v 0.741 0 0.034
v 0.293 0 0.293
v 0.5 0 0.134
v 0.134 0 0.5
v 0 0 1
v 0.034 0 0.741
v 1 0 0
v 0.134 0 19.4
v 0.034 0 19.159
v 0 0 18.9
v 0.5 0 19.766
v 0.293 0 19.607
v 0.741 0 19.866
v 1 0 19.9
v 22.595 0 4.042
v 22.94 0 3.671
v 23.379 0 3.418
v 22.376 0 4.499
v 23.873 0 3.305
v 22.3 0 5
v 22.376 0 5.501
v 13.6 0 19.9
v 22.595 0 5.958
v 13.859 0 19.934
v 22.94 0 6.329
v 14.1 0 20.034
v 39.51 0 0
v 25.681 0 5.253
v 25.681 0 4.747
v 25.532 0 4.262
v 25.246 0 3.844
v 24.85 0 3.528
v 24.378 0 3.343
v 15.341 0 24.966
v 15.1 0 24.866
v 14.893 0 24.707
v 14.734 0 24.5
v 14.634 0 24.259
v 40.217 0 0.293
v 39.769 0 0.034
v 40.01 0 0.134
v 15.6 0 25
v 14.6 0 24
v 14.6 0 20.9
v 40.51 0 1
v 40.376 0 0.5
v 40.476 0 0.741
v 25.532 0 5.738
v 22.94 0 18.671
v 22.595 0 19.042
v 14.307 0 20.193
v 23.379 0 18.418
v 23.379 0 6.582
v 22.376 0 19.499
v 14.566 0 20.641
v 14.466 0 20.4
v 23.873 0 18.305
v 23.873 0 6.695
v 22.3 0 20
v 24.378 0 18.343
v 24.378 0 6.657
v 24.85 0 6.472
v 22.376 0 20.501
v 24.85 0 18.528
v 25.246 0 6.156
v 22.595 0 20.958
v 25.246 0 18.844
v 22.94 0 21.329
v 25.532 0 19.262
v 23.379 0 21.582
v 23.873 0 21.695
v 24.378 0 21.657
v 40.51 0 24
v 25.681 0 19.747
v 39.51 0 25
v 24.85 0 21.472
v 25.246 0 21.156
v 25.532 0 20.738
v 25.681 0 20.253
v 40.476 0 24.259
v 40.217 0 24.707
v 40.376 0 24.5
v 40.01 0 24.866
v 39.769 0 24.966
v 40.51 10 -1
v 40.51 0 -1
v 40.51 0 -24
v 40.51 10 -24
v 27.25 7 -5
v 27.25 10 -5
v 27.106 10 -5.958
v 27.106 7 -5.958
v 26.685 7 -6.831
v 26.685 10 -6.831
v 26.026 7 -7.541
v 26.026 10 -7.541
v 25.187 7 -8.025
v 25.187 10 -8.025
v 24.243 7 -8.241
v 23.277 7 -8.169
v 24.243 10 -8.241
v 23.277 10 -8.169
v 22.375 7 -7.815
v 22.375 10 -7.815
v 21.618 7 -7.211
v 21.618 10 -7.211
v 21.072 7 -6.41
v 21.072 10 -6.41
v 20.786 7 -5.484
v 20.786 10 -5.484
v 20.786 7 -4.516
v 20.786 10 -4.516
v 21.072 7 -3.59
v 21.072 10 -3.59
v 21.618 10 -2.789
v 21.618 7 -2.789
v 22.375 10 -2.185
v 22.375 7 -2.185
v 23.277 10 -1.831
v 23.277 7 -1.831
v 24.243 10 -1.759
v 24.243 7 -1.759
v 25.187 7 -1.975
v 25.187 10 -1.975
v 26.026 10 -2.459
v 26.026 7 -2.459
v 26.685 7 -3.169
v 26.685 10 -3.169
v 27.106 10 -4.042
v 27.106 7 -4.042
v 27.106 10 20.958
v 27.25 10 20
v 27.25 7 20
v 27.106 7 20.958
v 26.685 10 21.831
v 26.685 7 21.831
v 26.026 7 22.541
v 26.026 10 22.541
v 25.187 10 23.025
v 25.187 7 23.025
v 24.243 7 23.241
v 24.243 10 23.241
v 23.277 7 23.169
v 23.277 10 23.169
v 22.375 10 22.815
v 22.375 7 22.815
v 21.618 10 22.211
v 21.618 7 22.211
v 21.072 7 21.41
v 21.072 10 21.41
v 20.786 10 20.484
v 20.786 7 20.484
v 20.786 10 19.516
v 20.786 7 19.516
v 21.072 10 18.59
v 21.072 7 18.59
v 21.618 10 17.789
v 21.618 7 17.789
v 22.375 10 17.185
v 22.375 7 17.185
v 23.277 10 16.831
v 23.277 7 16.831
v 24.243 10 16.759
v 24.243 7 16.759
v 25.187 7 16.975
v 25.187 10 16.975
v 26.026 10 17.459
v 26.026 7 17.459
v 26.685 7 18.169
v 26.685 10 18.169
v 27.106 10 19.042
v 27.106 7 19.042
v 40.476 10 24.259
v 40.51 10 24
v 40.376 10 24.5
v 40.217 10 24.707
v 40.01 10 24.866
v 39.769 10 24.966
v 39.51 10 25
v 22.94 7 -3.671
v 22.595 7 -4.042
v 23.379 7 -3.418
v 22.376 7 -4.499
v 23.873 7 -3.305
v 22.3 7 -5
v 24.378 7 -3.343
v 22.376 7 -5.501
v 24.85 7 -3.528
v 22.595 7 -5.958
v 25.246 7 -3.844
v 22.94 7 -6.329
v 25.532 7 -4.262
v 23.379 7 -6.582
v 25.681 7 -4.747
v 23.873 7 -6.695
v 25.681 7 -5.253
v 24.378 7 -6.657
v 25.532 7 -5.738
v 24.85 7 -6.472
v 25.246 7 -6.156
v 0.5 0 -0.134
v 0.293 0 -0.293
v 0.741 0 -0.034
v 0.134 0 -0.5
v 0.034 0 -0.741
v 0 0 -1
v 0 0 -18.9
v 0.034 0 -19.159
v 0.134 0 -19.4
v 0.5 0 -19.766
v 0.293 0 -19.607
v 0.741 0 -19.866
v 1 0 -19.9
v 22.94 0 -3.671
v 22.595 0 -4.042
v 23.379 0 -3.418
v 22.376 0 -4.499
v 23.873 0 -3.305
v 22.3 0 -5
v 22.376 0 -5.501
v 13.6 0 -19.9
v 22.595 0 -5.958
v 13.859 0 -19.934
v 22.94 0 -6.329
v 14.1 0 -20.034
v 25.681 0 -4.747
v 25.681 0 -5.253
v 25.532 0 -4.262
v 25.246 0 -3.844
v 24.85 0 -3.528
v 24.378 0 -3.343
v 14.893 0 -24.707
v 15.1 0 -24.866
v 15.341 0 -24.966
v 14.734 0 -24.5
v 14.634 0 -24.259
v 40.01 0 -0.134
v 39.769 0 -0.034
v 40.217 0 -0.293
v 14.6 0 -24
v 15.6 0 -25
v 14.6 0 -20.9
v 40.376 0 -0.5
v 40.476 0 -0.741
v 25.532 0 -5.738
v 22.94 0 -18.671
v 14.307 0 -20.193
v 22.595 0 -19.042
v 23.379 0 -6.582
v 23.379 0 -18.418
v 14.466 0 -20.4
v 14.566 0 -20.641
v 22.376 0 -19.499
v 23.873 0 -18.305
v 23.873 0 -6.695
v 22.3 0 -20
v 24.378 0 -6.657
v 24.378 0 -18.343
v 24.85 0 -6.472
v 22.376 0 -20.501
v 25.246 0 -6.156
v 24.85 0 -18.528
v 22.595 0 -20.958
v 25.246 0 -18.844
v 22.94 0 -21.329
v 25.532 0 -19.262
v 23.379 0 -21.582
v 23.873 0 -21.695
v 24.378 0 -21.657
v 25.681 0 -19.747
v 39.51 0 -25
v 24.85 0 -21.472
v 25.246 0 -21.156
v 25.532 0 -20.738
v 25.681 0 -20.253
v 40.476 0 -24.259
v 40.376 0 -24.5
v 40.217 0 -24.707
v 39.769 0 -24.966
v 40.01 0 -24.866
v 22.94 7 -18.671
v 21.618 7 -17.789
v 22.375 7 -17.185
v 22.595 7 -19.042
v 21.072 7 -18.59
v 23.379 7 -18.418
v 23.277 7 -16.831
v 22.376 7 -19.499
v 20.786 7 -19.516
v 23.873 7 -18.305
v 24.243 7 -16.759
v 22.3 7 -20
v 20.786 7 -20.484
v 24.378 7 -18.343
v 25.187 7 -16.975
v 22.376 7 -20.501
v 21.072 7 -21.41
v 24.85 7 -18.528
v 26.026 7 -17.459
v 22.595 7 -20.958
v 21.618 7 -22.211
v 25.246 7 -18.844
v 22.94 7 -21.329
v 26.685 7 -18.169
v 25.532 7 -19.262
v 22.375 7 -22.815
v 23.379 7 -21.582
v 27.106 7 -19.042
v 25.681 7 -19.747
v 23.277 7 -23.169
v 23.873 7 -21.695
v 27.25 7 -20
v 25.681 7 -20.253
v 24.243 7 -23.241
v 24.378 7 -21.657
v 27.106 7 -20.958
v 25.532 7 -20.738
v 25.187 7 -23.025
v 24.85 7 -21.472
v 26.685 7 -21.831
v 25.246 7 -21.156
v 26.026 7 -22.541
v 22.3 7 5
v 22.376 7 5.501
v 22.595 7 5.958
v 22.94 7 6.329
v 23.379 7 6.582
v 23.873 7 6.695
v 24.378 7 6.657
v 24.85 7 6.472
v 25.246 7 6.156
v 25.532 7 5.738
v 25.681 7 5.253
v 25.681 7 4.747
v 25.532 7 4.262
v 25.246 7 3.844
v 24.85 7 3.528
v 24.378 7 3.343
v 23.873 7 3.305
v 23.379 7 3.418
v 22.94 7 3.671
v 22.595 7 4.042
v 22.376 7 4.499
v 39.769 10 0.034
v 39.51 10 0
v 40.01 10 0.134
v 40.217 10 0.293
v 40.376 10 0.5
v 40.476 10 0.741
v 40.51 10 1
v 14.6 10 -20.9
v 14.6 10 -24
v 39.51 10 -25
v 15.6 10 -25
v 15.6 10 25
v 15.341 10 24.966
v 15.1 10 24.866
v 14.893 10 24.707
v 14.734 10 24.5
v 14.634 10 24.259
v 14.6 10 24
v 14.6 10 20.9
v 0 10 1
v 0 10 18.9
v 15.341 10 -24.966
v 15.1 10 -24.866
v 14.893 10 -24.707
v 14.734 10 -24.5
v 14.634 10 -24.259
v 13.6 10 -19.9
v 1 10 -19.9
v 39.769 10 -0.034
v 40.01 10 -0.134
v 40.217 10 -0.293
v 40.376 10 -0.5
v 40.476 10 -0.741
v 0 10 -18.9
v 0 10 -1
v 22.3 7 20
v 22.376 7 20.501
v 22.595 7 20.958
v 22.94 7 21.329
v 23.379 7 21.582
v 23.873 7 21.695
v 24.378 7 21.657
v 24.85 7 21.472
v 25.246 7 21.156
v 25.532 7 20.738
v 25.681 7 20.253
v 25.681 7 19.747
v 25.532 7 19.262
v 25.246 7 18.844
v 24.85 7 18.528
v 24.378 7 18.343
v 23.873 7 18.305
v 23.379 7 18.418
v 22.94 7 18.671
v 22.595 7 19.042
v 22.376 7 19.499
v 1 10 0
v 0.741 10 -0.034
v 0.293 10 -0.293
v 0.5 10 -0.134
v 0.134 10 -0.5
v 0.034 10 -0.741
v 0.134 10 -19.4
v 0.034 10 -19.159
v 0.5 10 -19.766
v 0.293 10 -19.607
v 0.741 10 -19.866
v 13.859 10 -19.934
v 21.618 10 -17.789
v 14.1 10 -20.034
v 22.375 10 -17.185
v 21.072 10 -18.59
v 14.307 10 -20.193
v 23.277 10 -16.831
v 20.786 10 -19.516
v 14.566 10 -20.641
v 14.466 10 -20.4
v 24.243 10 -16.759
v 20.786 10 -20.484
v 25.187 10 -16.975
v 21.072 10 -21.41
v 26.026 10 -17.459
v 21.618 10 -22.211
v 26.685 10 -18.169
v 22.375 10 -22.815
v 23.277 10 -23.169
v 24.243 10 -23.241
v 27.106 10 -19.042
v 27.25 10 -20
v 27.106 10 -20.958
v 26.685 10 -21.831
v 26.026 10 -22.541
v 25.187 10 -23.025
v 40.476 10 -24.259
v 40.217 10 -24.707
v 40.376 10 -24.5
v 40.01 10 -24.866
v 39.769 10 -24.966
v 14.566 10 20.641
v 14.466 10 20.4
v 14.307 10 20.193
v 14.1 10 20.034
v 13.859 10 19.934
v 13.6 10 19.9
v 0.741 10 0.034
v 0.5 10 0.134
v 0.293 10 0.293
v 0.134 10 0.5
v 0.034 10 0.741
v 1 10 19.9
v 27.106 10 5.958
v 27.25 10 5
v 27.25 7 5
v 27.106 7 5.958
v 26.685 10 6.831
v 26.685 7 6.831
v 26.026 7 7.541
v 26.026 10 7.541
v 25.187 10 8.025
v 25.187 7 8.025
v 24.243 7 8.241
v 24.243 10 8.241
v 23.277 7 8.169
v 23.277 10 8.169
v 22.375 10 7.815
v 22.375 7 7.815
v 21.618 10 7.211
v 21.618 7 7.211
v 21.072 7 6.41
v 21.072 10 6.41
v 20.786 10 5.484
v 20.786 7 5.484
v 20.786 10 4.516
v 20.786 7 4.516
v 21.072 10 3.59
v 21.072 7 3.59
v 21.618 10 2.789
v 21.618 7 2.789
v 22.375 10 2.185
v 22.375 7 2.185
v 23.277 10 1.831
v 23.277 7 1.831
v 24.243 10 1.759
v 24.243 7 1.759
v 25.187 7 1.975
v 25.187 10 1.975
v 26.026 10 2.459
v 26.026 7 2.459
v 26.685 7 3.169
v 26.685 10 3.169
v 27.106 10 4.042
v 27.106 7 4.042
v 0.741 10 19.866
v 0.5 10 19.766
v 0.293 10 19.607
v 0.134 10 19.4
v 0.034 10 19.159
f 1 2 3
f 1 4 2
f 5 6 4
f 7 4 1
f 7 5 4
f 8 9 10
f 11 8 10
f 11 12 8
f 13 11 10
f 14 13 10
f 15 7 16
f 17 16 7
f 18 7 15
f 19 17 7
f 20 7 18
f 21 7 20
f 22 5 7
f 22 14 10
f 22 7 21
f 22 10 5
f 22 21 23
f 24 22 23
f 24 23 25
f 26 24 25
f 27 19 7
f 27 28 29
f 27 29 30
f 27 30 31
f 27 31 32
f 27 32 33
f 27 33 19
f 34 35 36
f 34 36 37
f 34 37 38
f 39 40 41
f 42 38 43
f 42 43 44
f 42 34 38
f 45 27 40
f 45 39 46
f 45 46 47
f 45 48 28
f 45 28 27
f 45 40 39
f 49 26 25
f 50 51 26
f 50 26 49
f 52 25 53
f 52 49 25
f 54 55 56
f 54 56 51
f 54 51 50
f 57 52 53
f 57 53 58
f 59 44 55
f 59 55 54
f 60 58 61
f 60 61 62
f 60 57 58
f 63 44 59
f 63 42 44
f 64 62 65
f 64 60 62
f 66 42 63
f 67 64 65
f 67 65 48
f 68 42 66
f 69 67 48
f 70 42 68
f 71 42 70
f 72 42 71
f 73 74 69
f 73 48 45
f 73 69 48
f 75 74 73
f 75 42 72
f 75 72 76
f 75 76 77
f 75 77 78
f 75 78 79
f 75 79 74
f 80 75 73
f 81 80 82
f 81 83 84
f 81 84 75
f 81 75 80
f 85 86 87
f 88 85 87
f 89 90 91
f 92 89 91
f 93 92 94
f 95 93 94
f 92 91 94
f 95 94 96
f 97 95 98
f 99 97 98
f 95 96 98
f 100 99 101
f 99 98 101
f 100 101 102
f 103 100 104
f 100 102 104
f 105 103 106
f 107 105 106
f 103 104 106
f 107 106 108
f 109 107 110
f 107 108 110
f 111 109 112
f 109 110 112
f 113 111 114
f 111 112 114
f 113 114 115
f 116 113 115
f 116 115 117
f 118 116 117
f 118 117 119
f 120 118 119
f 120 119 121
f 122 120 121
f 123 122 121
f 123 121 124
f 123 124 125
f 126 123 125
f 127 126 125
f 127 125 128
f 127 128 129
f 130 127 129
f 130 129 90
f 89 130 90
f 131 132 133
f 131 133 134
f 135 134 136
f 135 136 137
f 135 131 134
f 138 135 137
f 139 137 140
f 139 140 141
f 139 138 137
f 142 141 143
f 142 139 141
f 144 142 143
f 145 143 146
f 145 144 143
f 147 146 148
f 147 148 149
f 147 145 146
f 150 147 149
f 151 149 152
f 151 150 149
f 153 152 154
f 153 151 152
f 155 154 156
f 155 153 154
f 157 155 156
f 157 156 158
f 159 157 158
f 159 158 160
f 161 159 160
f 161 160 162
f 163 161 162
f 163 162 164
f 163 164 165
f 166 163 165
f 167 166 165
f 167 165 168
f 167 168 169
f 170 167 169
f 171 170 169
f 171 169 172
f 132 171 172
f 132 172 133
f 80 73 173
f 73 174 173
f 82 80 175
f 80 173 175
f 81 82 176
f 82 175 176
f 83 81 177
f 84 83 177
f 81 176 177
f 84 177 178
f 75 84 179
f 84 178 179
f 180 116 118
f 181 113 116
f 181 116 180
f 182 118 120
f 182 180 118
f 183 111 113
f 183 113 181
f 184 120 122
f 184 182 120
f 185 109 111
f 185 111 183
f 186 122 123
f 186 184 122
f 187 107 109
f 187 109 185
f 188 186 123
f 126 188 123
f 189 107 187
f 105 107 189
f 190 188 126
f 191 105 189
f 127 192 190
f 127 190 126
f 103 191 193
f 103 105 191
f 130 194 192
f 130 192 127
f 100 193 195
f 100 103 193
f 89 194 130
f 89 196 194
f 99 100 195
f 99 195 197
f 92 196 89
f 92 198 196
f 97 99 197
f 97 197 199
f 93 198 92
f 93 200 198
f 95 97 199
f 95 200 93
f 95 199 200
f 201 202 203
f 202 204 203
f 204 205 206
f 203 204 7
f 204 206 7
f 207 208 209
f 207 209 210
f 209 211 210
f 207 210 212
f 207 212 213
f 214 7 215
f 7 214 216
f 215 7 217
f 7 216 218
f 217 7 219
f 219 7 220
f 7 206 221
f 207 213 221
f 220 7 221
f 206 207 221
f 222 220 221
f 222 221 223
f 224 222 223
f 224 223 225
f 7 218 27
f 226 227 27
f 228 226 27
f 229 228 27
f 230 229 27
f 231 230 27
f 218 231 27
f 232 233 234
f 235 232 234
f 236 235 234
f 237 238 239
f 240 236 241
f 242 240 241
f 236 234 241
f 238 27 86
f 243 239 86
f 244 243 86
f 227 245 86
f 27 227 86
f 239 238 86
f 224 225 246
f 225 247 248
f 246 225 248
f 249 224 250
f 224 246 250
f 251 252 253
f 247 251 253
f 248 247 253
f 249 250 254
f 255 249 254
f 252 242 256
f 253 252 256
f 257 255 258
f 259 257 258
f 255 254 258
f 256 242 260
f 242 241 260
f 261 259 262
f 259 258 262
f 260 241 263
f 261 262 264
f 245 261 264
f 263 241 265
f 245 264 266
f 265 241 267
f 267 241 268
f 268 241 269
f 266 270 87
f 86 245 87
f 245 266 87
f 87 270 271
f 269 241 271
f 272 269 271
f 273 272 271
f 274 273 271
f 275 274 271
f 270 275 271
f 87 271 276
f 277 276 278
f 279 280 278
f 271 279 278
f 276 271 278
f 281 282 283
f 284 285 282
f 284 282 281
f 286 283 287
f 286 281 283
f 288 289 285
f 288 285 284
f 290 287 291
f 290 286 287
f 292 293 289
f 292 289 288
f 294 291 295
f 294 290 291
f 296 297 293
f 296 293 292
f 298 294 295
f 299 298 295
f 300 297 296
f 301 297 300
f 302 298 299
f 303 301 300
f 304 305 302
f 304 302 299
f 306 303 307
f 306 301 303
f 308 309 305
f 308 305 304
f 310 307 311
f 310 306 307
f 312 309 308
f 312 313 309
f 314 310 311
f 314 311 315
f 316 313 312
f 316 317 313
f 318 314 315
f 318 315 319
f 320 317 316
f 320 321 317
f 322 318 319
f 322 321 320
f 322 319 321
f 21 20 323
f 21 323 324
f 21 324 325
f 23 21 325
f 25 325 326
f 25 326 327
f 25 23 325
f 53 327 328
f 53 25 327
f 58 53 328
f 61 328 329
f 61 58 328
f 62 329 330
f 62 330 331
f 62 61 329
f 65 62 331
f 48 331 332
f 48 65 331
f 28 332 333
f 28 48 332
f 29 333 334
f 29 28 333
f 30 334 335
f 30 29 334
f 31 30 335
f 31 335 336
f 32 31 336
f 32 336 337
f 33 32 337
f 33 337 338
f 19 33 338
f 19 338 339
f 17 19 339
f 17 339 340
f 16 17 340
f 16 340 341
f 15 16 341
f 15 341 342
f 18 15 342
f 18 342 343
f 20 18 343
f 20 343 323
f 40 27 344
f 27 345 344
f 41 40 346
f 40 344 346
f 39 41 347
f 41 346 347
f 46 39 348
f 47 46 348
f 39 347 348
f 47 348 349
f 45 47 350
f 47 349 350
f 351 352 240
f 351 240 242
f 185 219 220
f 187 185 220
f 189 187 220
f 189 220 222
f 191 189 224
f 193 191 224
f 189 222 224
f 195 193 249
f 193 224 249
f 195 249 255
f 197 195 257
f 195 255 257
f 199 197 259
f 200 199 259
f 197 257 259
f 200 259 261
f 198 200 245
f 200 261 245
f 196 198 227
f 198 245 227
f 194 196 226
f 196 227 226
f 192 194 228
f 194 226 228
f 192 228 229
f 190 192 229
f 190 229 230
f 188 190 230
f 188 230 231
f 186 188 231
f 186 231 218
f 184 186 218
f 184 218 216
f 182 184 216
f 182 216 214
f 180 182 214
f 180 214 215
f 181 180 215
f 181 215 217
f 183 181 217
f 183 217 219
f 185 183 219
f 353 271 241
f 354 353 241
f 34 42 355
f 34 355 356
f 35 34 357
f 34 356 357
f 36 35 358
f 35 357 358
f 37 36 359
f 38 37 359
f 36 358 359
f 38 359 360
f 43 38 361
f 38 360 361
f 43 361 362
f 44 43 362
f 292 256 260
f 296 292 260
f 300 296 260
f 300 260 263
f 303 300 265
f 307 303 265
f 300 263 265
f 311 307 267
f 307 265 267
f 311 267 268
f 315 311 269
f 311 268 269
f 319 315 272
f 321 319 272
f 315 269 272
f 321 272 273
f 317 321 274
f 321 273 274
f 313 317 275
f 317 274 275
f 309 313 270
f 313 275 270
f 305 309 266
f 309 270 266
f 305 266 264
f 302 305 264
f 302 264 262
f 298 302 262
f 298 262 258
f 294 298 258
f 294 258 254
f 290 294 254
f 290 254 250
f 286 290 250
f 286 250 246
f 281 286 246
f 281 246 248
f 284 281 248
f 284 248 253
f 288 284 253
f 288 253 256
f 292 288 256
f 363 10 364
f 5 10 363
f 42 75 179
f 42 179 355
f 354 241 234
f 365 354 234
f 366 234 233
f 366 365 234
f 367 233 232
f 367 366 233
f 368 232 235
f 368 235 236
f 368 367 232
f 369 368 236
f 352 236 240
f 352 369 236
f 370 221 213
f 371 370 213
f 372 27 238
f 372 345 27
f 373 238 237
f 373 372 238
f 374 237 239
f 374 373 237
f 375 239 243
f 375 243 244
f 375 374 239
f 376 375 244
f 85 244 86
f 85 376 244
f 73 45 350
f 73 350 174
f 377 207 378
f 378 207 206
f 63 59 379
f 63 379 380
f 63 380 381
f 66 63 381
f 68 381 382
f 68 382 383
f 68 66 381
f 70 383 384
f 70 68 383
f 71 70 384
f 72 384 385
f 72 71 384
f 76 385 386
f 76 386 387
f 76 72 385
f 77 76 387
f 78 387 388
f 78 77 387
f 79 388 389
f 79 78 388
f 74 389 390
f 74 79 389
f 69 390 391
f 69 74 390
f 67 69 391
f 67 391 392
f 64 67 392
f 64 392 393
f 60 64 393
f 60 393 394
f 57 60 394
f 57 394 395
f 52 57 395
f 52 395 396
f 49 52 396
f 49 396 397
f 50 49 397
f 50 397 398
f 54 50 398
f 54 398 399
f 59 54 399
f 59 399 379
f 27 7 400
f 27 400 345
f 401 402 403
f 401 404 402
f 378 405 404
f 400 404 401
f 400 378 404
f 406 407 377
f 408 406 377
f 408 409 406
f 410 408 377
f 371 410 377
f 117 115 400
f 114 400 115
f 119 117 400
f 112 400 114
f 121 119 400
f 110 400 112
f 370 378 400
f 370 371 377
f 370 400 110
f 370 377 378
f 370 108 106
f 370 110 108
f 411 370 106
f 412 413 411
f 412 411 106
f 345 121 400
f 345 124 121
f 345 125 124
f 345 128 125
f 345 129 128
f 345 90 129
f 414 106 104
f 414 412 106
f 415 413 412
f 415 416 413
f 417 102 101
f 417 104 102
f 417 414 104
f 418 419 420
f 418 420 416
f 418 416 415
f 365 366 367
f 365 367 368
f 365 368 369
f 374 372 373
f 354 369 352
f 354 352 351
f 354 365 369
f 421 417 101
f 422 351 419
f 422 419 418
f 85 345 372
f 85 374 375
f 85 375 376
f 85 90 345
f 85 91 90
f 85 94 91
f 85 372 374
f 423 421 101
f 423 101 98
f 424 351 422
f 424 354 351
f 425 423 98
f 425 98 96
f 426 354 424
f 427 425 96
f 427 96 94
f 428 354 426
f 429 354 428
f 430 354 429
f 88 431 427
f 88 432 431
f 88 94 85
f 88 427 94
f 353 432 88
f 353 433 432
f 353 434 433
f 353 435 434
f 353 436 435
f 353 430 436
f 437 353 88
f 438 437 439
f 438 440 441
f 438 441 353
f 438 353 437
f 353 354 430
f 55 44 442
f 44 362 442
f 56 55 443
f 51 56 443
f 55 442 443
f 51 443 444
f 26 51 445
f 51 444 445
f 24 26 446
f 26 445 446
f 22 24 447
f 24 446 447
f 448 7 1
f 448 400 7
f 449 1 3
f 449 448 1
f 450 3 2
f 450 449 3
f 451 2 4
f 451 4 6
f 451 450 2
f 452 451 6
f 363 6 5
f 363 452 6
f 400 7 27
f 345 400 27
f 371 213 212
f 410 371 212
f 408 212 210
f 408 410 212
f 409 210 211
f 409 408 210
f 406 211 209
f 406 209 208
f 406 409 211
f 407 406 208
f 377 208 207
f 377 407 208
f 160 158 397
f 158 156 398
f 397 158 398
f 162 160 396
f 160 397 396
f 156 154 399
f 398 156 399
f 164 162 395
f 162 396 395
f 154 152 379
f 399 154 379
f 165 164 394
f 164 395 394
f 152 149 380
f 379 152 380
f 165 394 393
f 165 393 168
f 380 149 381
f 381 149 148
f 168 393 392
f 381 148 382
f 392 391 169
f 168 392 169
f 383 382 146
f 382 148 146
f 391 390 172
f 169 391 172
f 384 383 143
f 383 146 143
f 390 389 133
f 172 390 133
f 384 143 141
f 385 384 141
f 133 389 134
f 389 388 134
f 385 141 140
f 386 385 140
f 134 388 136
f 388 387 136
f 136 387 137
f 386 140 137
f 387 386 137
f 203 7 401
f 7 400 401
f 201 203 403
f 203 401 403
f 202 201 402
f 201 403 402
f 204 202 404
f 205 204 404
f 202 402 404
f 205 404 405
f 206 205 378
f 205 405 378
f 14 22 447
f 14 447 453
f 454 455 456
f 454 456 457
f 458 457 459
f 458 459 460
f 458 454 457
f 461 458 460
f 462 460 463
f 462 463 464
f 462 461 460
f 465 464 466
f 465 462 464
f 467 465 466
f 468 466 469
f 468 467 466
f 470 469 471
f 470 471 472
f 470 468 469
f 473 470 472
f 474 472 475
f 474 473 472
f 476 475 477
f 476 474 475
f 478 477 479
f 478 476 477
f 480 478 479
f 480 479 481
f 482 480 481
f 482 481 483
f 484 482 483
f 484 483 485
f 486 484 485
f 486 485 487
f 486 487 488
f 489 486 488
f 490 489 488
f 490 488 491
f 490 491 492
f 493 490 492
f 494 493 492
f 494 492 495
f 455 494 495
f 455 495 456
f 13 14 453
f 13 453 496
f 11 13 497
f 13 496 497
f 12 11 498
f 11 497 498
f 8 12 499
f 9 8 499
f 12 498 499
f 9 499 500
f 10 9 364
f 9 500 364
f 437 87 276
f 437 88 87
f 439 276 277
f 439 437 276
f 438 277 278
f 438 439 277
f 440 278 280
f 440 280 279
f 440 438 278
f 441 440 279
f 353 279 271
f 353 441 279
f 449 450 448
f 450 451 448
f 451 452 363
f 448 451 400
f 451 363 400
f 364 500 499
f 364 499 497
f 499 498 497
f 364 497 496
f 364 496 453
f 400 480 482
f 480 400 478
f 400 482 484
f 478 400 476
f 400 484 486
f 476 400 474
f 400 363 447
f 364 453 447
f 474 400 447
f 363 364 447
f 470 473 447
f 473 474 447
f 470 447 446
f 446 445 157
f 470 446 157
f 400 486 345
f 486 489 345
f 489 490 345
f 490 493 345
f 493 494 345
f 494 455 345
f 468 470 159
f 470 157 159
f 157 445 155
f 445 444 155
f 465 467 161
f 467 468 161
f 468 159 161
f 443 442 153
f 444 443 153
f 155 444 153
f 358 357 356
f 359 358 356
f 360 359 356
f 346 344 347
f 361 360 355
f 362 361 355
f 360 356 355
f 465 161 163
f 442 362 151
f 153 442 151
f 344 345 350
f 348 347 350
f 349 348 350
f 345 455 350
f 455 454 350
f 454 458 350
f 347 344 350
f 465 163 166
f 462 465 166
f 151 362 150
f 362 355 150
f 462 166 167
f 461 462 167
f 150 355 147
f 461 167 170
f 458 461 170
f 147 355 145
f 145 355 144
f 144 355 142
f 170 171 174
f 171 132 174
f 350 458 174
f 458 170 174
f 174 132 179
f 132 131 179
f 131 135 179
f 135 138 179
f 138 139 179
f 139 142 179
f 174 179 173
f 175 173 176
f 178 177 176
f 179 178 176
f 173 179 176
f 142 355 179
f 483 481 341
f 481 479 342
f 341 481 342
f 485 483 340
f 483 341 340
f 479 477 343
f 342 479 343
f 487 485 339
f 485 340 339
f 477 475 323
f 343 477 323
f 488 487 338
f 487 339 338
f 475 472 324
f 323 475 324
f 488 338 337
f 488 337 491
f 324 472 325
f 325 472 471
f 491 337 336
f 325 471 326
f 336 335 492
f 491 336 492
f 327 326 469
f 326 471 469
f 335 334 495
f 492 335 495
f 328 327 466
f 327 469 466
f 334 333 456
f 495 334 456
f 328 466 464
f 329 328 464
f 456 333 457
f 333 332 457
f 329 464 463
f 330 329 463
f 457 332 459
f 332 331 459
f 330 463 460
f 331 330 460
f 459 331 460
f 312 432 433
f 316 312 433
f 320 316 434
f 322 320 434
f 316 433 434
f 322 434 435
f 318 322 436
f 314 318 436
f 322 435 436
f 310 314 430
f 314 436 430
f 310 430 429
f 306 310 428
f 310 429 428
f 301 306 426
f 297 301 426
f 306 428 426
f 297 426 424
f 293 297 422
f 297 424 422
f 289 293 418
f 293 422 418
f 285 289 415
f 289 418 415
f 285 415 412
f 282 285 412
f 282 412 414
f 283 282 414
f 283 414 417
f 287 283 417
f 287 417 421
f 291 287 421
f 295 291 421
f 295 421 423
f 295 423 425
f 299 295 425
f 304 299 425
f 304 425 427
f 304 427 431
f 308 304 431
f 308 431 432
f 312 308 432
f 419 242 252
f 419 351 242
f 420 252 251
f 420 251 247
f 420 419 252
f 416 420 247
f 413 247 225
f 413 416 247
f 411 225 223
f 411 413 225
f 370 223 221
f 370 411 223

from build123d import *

# Parameters (mm, degrees)
BOSS_EXTRUDE1_DEPTH            = 10
FILLET1_R                      = 1
CBORE_FOR_M3_SHCS1_D           = 3.4
CBORE_FOR_M3_SHCS1_DEPTH       = 10
CBORE_FOR_M3_SHCS1_CBORE_D     = 6.5
CBORE_FOR_M3_SHCS1_CBORE_DEPTH = 3


with BuildPart() as part:
    # Sketch1 → Boss-Extrude1 (new body)
    with BuildSketch(Plane(origin=(0, 0, 0), x_dir=(1, 0, 0), z_dir=(0, 1, 0))):
        Polygon((0, 0), (40.51, 0), (40.51, 25), (14.6, 25), (14.6, 19.9), (0, 19.9), align=None)
    extrude(amount=BOSS_EXTRUDE1_DEPTH)

    # Fillet1
    fillet1_edges = [part.edges().sort_by_distance(p)[0] for p in [
        (0, 5, -19.9),
        (14.6, 5, -19.9),
        (14.6, 5, -25),
        (40.51, 5, -25),
        (40.51, 5, 0),
        (0, 5, 0),
    ]]
    fillet(fillet1_edges, radius=FILLET1_R)

    # CBORE for M3 SHCS1
    with Locations(Plane(origin=(0, 10, 0), x_dir=(1, 0, 0), z_dir=(0, 1, 0))):
        with Locations((24, 20), (24, 5)):
            CounterBoreHole(CBORE_FOR_M3_SHCS1_D / 2, CBORE_FOR_M3_SHCS1_CBORE_D / 2, CBORE_FOR_M3_SHCS1_CBORE_DEPTH, depth=CBORE_FOR_M3_SHCS1_DEPTH)


with BuildPart() as body_2:
    # Mirror1: mirrored copy
    add(part.part.mirror(Plane(origin=(0, 10, 0), x_dir=(1, 0, 0), z_dir=(0, 0, -1))))


solid = Compound([part.part, body_2.part])
